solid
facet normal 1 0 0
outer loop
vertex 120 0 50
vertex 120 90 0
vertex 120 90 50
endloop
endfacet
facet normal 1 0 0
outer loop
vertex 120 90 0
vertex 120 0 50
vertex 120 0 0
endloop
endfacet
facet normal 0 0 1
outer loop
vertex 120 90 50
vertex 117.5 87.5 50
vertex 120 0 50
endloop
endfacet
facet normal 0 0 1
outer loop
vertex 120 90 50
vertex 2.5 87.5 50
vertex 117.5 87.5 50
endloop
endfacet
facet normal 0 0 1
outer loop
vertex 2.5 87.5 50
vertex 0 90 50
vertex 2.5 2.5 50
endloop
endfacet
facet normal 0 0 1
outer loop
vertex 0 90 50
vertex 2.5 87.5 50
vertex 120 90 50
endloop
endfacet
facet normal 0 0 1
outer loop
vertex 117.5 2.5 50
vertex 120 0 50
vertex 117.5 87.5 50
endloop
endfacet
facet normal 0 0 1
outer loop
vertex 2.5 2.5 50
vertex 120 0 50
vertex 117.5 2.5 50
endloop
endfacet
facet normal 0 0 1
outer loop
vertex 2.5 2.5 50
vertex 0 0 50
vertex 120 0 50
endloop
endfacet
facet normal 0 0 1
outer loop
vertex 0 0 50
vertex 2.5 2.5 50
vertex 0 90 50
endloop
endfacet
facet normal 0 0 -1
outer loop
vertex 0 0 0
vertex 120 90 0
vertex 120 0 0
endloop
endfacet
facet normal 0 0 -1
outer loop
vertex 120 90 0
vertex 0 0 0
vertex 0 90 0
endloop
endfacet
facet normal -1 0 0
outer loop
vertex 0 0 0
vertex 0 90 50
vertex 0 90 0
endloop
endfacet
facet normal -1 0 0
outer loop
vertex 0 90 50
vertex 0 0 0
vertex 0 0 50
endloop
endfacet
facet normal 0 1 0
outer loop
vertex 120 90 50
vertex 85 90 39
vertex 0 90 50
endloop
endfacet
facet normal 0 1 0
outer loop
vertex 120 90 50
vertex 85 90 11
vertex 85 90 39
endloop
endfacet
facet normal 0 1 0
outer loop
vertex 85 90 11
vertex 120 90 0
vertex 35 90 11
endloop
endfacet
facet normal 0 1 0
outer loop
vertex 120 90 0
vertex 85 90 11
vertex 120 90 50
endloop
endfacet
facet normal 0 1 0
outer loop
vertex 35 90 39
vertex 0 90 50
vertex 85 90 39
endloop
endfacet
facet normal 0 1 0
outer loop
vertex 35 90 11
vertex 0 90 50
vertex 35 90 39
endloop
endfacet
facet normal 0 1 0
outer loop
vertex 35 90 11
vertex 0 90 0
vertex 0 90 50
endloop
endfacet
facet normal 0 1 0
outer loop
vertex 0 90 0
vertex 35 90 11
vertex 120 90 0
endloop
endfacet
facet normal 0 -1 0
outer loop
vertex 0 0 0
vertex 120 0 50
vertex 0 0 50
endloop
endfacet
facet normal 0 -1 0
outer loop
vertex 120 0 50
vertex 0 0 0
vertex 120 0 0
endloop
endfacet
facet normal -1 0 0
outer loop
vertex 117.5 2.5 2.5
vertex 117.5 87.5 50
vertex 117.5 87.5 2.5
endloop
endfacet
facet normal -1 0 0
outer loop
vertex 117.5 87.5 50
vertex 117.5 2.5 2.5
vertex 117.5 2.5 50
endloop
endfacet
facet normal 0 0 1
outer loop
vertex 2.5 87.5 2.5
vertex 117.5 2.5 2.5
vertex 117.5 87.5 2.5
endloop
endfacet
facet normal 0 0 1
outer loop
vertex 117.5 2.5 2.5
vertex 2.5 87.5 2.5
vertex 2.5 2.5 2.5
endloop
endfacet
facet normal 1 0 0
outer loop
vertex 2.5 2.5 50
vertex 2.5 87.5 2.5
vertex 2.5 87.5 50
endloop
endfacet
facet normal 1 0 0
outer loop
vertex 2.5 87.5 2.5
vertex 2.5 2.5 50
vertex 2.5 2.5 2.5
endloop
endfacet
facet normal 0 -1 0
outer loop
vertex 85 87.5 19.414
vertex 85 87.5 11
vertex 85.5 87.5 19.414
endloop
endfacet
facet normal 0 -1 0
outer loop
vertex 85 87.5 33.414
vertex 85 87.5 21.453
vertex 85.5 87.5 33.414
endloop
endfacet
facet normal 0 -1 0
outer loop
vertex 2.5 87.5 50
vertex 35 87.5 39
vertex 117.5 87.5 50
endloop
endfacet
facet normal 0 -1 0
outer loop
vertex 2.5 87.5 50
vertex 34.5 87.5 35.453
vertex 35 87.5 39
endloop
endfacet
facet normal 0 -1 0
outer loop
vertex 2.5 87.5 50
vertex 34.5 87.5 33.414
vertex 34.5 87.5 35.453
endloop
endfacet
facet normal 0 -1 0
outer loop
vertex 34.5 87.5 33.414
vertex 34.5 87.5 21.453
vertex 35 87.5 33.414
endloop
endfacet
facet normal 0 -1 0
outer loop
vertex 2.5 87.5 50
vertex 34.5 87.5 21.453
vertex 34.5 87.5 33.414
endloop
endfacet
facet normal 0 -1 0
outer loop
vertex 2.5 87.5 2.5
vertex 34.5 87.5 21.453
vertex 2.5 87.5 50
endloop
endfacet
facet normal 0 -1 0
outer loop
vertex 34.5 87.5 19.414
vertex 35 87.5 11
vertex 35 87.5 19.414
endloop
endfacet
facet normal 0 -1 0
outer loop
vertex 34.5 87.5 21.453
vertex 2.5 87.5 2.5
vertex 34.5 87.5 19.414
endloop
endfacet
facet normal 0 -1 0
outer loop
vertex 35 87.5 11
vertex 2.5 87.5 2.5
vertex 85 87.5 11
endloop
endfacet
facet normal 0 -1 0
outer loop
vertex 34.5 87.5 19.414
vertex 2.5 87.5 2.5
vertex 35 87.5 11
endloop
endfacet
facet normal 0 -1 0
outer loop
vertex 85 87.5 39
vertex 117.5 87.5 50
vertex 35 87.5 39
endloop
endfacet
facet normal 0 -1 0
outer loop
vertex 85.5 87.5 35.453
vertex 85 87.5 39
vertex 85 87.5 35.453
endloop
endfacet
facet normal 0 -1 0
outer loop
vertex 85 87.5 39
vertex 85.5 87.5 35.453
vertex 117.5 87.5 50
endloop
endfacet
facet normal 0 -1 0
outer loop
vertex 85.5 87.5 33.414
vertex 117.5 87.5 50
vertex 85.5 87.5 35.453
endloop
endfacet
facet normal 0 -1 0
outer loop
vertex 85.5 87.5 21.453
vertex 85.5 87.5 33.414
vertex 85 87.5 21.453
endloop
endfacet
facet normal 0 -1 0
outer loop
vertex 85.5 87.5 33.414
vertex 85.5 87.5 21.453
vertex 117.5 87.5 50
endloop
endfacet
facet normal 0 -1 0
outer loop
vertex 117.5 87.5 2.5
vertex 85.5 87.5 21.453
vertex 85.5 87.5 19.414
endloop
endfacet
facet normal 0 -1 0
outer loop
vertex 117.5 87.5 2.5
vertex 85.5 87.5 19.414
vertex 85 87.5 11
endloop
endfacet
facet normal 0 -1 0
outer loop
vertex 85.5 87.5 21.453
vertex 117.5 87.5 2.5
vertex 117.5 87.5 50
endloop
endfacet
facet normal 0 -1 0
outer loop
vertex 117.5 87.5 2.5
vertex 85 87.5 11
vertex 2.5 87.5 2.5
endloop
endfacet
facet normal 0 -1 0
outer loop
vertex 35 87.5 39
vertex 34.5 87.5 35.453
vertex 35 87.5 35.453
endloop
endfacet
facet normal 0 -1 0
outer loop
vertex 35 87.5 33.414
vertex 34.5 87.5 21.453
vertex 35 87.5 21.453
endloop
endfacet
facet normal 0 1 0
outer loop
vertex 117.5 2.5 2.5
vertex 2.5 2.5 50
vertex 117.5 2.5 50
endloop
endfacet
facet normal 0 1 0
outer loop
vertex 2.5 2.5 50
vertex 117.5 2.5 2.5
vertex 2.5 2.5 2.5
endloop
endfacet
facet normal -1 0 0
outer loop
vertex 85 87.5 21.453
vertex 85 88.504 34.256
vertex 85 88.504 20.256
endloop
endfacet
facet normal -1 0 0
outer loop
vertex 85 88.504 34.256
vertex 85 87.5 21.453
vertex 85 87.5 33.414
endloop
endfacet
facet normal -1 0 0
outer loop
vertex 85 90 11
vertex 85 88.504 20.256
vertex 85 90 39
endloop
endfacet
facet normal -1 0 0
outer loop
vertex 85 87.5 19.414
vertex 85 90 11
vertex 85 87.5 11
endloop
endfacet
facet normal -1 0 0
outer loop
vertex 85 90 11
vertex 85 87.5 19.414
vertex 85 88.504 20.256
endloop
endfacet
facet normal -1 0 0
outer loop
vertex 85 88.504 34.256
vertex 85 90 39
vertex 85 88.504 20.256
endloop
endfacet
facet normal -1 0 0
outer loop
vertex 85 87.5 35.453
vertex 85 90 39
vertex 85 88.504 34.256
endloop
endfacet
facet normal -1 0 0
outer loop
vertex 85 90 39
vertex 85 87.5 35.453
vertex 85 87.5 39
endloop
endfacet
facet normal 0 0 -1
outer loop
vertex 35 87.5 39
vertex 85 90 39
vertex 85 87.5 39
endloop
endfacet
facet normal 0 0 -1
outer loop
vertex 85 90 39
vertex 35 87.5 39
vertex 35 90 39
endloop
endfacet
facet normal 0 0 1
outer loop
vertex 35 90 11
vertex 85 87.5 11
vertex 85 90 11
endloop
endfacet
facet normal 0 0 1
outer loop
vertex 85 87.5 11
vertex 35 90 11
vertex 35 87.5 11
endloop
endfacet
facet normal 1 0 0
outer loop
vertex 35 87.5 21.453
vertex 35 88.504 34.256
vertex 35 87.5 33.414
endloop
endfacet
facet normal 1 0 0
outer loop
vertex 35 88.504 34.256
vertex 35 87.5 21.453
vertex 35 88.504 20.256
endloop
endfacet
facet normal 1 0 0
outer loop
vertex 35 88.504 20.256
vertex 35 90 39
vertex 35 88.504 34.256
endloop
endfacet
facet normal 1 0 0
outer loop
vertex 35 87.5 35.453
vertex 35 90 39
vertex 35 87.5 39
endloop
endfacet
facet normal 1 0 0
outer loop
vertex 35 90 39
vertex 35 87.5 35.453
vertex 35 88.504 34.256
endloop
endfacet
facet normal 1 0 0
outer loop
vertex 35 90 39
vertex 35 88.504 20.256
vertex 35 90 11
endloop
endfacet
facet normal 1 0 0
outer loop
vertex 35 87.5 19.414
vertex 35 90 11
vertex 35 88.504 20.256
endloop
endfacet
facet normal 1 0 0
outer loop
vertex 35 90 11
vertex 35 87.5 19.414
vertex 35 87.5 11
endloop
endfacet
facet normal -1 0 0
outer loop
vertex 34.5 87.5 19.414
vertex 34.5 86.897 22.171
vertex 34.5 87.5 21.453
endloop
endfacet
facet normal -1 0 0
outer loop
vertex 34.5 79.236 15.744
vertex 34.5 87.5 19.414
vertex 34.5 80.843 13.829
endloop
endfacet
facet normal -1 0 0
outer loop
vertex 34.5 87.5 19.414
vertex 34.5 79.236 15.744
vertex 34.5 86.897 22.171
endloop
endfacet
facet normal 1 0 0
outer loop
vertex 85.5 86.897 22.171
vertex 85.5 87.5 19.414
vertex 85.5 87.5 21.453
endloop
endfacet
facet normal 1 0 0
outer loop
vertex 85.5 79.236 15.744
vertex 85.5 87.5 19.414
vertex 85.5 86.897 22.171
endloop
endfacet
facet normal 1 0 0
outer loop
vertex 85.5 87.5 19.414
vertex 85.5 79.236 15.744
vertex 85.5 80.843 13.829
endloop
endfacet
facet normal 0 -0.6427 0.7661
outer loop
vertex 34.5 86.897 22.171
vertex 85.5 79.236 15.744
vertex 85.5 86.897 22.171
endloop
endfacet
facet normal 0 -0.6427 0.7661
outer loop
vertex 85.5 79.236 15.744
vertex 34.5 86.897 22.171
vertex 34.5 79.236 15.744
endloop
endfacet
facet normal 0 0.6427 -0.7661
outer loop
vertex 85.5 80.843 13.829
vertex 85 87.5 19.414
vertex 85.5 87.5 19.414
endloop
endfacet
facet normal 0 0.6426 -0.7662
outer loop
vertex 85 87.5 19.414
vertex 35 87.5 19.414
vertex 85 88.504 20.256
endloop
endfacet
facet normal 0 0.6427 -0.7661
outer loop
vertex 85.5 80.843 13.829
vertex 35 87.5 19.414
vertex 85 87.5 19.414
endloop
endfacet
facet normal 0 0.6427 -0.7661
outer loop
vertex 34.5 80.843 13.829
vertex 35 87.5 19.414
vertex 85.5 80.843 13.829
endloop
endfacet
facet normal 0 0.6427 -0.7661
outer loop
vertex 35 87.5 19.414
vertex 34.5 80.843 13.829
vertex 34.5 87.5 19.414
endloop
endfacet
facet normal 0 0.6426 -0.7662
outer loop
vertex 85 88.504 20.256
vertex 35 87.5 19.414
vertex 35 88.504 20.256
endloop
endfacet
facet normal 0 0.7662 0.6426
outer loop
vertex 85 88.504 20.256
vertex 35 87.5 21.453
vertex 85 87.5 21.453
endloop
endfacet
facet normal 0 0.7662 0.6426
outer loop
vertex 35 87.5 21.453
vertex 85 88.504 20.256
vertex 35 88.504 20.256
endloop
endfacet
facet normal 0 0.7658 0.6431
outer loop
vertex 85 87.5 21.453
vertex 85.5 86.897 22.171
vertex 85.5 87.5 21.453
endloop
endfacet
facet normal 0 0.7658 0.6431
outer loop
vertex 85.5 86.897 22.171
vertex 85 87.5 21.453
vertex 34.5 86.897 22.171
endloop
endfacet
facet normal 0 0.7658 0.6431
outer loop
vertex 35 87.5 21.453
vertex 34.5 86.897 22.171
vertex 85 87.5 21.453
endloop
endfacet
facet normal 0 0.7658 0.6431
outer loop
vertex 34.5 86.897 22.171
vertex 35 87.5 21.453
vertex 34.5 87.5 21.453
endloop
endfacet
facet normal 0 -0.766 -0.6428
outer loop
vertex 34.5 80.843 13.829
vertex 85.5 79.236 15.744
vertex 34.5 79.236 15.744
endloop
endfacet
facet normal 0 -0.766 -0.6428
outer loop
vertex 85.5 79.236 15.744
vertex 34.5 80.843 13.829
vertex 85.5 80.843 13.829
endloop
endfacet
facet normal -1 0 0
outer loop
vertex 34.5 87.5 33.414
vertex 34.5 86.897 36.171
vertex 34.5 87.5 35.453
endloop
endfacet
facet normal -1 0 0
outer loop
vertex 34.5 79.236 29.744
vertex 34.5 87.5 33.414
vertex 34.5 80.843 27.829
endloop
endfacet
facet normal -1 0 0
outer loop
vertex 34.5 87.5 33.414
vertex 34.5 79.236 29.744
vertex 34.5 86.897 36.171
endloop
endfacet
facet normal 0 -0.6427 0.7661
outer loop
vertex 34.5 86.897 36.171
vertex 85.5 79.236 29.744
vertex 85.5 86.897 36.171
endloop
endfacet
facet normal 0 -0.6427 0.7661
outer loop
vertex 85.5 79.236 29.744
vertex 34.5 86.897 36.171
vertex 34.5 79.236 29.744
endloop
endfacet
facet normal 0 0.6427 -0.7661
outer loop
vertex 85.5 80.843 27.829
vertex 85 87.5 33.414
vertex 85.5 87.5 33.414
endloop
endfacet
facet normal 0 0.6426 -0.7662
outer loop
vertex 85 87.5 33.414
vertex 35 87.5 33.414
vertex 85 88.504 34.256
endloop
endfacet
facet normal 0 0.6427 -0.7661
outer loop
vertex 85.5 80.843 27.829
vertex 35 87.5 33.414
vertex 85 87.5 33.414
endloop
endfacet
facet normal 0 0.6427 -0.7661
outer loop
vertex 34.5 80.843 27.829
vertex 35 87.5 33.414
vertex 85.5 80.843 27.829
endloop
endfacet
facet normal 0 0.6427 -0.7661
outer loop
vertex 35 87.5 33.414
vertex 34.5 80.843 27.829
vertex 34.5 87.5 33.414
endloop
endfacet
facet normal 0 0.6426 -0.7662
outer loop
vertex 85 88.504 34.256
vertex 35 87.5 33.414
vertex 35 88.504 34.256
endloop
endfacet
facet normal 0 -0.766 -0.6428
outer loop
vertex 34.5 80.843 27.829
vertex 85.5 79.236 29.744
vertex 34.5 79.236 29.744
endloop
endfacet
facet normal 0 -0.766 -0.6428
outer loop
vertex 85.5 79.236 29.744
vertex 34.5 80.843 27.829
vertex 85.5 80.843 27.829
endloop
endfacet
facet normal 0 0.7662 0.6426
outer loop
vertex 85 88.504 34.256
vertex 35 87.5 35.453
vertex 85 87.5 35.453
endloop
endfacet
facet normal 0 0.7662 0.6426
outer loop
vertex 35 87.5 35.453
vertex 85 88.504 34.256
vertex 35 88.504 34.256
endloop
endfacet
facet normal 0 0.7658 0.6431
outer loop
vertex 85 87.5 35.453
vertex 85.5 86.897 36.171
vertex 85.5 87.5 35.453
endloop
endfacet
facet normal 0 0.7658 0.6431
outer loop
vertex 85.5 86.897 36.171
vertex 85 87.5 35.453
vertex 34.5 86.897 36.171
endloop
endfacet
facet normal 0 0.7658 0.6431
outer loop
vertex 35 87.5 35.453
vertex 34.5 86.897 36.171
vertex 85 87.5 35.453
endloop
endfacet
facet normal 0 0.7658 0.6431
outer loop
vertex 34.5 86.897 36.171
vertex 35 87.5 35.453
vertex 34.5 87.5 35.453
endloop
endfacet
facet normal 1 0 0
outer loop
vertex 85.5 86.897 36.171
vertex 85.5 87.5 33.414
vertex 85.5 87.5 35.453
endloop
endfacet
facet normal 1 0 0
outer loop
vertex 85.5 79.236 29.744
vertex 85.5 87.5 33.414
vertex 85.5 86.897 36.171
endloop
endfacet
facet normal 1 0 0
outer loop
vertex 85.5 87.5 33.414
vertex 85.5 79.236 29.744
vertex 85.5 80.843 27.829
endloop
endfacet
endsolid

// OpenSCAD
$fn = 32;

// ----------------------------------------------------------------------
// Vent box: louvers enclosure
// ----------------------------------------------------------------------

// --- parameters (mm) ---
box_l = 120;              // box length, X
box_w = 90;               // box width, Y
box_h = 50;               // box height, Z
wall_t = 2.5;             // shell wall thickness
win_l = 50;               // vent window width, X
win_h = 28;               // vent window height, Z
slat_t = 2.5;             // louver slat thickness
slat_d = 10;              // louver slat depth
slat_a = 40;              // louver slat angle, degrees
slat_pitch = 14;          // louver pitch
slat_yc = 83.87;          // slat centreline Y

win_z0 = (box_h - win_h) / 2;  // window lower edge Z
n_slats = 2;  // louver count
slat_z0 = win_z0 + (win_h - (n_slats - 1) * slat_pitch) / 2;

difference() {
  union() {
    difference() {
      cube([box_l, box_w, box_h]);
  translate([wall_t, wall_t, wall_t])
    cube([box_l - 2 * wall_t, box_w - 2 * wall_t, box_h]);
  translate([(box_l - win_l) / 2, box_w - wall_t - 1, win_z0])
    cube([win_l, wall_t + 2, win_h]);
    }
    for (i = [0 : n_slats - 1])
      translate([box_l / 2, slat_yc, slat_z0 + i * slat_pitch])
        rotate([slat_a, 0, 0])
          cube([win_l + 1, slat_d, slat_t], center = true);
  }
}
